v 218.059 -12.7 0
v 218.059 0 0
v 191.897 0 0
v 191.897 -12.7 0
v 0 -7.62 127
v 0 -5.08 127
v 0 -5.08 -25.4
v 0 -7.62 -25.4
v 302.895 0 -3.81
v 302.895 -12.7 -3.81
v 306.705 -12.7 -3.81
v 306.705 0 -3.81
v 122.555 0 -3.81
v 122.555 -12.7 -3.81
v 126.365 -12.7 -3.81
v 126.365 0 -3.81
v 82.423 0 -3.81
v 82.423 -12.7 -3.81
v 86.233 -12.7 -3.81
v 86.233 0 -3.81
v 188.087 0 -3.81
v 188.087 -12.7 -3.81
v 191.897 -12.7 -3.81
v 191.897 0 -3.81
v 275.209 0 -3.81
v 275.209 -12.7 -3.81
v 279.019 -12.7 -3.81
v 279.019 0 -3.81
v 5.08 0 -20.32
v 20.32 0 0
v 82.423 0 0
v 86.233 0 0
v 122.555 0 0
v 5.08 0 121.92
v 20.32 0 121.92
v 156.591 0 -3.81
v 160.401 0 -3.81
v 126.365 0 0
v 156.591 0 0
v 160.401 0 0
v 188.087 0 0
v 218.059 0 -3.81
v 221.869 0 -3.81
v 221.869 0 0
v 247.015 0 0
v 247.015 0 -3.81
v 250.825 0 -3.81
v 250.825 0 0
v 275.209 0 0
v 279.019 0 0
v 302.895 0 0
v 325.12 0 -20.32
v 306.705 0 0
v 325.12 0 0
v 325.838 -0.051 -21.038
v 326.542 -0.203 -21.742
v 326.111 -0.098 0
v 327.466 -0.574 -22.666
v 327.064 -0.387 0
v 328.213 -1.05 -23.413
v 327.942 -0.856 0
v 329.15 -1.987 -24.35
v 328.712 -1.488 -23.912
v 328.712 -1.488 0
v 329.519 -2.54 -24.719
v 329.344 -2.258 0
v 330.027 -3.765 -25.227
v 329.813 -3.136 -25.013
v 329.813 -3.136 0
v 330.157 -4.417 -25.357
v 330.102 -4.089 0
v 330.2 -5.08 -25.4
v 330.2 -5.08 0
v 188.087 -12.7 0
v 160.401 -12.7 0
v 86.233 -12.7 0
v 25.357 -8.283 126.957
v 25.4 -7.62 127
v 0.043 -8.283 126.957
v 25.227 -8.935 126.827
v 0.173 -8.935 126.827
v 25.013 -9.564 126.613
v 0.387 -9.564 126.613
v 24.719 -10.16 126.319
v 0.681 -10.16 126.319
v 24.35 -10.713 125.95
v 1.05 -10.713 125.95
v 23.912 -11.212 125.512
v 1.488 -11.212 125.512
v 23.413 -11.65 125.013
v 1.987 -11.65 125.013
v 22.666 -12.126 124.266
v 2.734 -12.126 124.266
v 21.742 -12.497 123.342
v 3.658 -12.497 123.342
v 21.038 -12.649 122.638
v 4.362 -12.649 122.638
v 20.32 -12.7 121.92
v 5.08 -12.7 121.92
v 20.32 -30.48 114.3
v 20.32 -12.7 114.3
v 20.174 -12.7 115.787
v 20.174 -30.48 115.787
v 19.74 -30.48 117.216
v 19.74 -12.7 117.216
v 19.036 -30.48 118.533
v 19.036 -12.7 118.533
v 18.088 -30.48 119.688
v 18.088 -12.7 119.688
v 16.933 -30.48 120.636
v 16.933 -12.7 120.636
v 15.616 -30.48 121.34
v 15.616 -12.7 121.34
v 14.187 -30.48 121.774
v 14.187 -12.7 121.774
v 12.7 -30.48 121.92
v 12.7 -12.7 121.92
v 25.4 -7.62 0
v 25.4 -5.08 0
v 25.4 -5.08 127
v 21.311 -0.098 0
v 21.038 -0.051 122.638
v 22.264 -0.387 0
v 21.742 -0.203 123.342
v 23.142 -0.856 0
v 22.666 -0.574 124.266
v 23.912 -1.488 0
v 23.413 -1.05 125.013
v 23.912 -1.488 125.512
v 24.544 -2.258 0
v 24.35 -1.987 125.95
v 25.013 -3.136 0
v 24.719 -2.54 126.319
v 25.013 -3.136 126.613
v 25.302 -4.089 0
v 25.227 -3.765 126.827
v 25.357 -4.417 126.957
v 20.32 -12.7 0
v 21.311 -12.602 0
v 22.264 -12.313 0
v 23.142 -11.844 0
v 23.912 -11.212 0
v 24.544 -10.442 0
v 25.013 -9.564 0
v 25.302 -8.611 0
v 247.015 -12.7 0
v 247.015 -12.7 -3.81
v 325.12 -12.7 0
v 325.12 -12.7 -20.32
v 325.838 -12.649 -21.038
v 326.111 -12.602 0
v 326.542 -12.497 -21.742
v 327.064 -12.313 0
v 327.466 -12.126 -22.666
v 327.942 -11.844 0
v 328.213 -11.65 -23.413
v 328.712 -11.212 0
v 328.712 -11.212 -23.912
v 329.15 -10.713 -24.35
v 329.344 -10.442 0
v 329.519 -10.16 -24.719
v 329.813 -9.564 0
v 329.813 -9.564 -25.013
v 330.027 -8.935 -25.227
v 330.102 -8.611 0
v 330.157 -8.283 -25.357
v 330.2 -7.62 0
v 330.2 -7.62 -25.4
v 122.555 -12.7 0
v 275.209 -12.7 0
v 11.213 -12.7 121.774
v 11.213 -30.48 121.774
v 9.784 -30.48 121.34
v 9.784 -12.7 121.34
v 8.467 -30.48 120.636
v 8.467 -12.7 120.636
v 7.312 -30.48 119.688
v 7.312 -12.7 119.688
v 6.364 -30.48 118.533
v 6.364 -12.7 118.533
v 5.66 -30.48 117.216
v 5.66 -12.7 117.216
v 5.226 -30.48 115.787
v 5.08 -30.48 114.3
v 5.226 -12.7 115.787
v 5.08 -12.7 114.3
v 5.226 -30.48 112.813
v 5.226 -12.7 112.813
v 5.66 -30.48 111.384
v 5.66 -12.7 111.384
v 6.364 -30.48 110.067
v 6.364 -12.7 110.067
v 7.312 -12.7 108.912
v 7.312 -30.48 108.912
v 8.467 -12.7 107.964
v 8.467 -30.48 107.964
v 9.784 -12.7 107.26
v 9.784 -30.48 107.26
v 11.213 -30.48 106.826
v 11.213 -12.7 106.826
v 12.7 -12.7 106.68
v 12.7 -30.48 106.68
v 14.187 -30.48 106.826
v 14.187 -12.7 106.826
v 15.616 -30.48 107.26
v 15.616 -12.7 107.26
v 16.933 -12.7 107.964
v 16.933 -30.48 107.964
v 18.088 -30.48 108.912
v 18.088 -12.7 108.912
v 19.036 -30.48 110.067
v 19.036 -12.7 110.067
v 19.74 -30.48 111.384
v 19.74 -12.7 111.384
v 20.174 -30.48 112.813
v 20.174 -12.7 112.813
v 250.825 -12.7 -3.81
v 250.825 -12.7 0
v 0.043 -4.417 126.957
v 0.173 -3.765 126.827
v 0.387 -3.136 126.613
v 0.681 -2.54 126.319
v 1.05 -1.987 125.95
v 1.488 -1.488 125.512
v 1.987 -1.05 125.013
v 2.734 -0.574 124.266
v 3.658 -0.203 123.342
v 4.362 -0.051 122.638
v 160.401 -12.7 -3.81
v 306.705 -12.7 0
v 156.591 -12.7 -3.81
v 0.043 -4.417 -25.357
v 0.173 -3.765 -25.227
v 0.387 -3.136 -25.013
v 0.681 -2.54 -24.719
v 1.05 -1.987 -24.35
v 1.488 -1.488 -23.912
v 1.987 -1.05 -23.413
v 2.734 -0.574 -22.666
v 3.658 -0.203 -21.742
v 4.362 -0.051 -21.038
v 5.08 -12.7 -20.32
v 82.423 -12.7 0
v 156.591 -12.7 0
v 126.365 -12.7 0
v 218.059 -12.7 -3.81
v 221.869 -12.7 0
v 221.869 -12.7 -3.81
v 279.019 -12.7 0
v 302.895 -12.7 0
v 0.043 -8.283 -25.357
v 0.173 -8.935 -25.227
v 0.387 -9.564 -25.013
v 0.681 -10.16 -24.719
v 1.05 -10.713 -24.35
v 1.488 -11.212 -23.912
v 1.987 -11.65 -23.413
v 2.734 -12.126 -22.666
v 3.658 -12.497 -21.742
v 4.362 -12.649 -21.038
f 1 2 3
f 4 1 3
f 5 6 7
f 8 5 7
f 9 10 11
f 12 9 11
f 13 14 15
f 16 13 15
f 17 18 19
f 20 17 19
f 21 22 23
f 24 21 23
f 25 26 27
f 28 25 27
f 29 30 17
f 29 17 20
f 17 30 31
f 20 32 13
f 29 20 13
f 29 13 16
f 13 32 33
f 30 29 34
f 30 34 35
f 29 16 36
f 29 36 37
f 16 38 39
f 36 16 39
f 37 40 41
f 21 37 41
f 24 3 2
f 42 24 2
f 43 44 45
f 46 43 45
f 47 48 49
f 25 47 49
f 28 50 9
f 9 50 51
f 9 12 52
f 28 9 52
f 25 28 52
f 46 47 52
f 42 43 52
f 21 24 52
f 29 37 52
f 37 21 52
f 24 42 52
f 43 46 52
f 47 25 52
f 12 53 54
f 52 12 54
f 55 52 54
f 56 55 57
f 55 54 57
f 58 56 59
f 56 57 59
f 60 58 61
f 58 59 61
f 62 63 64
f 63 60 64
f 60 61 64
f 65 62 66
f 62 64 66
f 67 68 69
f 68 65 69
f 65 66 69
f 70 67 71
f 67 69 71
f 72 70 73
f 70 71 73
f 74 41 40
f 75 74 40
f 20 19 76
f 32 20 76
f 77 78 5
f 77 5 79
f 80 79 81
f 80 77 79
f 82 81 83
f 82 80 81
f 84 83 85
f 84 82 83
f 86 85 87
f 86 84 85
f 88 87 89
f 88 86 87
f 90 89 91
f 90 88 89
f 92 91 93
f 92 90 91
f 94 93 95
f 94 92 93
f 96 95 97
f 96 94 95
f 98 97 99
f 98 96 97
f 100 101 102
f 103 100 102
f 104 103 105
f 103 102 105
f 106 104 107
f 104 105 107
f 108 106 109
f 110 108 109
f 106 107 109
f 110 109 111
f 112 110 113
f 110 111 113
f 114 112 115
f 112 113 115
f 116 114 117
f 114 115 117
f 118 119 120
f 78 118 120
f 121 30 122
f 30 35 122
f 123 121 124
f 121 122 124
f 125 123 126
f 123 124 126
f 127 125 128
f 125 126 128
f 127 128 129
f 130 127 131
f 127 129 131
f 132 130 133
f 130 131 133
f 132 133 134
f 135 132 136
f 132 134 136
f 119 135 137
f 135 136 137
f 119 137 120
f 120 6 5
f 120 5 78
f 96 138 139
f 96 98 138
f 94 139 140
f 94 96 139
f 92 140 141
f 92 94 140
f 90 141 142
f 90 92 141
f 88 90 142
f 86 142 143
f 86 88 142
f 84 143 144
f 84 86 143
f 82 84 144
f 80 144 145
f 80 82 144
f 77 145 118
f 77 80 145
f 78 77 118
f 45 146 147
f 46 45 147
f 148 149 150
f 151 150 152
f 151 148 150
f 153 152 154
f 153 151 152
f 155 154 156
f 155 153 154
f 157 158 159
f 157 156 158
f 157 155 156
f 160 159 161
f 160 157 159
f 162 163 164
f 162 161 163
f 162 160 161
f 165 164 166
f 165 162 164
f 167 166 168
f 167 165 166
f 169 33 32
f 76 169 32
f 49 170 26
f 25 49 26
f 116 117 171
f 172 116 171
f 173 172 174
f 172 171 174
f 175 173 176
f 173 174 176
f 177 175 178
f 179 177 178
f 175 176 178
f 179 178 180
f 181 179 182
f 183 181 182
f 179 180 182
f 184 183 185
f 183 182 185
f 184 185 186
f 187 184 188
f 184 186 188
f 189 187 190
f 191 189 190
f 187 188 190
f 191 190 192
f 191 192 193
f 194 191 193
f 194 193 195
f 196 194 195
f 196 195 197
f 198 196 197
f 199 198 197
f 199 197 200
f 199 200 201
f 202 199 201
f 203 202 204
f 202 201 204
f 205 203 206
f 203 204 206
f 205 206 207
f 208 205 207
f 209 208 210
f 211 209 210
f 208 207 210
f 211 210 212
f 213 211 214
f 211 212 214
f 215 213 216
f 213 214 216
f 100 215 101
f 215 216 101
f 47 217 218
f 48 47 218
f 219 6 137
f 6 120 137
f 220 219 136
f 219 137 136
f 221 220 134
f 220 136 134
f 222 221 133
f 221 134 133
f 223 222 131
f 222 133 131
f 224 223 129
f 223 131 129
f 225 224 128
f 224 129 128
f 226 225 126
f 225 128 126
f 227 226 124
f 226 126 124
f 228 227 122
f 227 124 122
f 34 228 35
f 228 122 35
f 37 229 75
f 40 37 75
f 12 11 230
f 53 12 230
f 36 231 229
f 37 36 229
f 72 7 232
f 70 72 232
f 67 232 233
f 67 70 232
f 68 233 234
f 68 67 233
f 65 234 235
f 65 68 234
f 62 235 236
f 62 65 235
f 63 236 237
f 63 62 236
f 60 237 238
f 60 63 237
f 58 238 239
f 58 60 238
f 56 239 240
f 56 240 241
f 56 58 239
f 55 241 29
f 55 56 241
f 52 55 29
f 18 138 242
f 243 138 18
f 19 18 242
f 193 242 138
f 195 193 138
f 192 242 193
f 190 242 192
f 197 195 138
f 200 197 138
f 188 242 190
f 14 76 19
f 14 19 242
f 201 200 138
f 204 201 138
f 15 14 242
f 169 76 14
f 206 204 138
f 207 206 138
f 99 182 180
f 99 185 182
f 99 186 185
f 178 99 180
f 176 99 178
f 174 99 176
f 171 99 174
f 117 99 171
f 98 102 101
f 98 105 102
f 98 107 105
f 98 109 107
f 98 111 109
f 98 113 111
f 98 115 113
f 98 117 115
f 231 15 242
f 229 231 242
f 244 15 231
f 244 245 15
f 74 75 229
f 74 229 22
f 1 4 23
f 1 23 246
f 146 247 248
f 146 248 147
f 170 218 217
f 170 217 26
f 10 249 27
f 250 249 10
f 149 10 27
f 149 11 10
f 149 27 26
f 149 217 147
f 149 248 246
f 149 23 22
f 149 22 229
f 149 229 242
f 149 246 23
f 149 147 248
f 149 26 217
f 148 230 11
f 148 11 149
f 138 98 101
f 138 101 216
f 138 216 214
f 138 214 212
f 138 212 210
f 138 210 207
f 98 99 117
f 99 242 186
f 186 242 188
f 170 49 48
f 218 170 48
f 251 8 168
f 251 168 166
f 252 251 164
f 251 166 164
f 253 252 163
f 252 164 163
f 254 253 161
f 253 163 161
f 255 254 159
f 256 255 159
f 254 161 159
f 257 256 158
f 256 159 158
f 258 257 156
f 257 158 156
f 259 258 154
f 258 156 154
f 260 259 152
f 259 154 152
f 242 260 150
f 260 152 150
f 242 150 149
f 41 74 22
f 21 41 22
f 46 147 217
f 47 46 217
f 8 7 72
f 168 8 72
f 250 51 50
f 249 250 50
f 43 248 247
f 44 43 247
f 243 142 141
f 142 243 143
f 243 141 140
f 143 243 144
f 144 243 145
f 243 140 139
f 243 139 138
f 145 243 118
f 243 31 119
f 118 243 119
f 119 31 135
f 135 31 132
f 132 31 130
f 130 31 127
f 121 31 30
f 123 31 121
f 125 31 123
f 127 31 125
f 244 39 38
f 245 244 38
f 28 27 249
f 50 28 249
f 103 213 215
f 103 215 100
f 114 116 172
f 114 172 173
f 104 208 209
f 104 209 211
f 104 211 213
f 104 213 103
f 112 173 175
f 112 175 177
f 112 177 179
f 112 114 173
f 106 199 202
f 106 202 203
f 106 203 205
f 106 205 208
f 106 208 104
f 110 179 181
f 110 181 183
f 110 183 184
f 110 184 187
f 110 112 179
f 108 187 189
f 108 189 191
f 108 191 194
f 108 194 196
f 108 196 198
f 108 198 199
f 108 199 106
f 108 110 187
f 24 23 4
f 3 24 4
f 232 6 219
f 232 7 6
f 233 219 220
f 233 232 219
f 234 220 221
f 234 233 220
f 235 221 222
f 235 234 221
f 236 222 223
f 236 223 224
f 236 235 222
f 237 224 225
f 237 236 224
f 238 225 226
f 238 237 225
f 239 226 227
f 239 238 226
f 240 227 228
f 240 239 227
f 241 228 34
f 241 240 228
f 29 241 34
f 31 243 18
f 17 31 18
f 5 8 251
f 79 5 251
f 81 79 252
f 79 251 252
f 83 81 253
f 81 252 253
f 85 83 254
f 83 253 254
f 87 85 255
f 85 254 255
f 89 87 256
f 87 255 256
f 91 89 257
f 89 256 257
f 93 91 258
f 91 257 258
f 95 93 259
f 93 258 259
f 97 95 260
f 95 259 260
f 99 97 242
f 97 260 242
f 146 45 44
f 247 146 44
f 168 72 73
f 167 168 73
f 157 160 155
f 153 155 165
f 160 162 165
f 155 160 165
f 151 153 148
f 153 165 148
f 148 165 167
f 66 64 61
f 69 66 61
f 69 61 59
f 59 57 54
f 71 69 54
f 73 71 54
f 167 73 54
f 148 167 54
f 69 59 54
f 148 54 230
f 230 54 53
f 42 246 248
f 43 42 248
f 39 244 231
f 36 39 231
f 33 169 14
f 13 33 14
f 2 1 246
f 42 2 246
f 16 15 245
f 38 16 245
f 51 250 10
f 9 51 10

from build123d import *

# Parameters (mm, degrees)
F0_W     = 25.4
F0_H     = 127
F1_DEPTH = 12.7
F3_DEPTH = 17.78
F5_DEPTH = 25.4
F6_R     = 5.07999


# Not quite as in the source:
# - a fillet or chamfer is up to 0.001 mm smaller than in the source, because OpenCascade refuses the exact size


with BuildPart() as f1:
    # F0 (on Front) → F1 (new body)
    with BuildSketch(Plane.XZ):
        with Locations((12.7, 63.5)):
            Rectangle(F0_W, F0_H)
        Polygon((25.4, 0), (0, 0), (0, -25.4), (330.2, -25.4), (330.2, 0), align=None)
    extrude(amount=F1_DEPTH)

    # F2 (on face) → F3 (join)
    with BuildSketch(Plane.XZ.offset(12.7)):
        with BuildLine():
            ThreePointArc((12.7, 121.92), (7.3118463274, 108.9118463274), (20.32, 114.3))
            ThreePointArc((20.32, 114.3), (18.0881536726, 119.6881536726), (12.7, 121.92))
        make_face()
    extrude(amount=F3_DEPTH)

    # F4 (on face) → F5 (cut)
    with BuildSketch(Plane.XZ.offset(12.7)):
        Polygon((82.423, 3.81), (82.423, 0), (84.328, 0), (86.233, 0), (86.233, 3.81), align=None)
        Polygon((84.328, 0), (82.423, 0), (82.423, -3.81), (86.233, -3.81), (86.233, 0), align=None)
        Polygon((302.895, 3.81), (302.895, 0), (302.895, -3.81), (306.705, -3.81), (306.705, 3.81), align=None)
        Polygon((275.209, 3.81), (275.209, 0), (277.114, 0), (279.019, 0), (279.019, 3.81), align=None)
        Polygon((277.114, 0), (275.209, 0), (275.209, -3.81), (279.019, -3.81), (279.019, 0), align=None)
        Polygon((247.015, 3.81), (247.015, 0), (248.92, 0), (250.825, 0), (250.825, 3.81), align=None)
        Polygon((248.92, 0), (247.015, 0), (247.015, -3.81), (250.825, -3.81), (250.825, 0), align=None)
        Polygon((218.059, 3.81), (218.059, 0), (219.964, 0), (221.869, 0), (221.869, 3.81), align=None)
        Polygon((219.964, 0), (218.059, 0), (218.059, -3.81), (221.869, -3.81), (221.869, 0), align=None)
        Polygon((188.087, 3.81), (188.087, 0), (189.992, 0), (191.897, 0), (191.897, 3.81), align=None)
        Polygon((189.992, 0), (188.087, 0), (188.087, -3.81), (191.897, -3.81), (191.897, 0), align=None)
        Polygon((156.591, 3.81), (156.591, 0), (158.496, 0), (160.401, 0), (160.401, 3.81), align=None)
        Polygon((158.496, 0), (156.591, 0), (156.591, -3.81), (160.401, -3.81), (160.401, 0), align=None)
        Polygon((122.555, 3.81), (122.555, 0), (124.46, 0), (126.365, 0), (126.365, 3.81), align=None)
        Polygon((124.46, 0), (122.555, 0), (122.555, -3.81), (126.365, -3.81), (126.365, 0), align=None)
    extrude(amount=-F5_DEPTH, mode=Mode.SUBTRACT)

    # F6 (radius 5.08 in the source; OpenCascade refuses exactly that, so slightly less here)
    f6_edges = [f1.edges().sort_by_distance(p)[0] for p in [
        (165.1, -12.7, -25.4),
        (165.1, 0, -25.4),
        (0, 0, 50.8),
        (0, -12.7, 50.8),
        (12.7, 0, 127),
        (12.7, -12.7, 127),
        (25.4, 0, 63.5),
        (25.4, -12.7, 63.5),
        (330.2, 0, -12.7),
        (330.2, -12.7, -12.7),
    ]]
    fillet(f6_edges, radius=F6_R)


solid = f1.part
